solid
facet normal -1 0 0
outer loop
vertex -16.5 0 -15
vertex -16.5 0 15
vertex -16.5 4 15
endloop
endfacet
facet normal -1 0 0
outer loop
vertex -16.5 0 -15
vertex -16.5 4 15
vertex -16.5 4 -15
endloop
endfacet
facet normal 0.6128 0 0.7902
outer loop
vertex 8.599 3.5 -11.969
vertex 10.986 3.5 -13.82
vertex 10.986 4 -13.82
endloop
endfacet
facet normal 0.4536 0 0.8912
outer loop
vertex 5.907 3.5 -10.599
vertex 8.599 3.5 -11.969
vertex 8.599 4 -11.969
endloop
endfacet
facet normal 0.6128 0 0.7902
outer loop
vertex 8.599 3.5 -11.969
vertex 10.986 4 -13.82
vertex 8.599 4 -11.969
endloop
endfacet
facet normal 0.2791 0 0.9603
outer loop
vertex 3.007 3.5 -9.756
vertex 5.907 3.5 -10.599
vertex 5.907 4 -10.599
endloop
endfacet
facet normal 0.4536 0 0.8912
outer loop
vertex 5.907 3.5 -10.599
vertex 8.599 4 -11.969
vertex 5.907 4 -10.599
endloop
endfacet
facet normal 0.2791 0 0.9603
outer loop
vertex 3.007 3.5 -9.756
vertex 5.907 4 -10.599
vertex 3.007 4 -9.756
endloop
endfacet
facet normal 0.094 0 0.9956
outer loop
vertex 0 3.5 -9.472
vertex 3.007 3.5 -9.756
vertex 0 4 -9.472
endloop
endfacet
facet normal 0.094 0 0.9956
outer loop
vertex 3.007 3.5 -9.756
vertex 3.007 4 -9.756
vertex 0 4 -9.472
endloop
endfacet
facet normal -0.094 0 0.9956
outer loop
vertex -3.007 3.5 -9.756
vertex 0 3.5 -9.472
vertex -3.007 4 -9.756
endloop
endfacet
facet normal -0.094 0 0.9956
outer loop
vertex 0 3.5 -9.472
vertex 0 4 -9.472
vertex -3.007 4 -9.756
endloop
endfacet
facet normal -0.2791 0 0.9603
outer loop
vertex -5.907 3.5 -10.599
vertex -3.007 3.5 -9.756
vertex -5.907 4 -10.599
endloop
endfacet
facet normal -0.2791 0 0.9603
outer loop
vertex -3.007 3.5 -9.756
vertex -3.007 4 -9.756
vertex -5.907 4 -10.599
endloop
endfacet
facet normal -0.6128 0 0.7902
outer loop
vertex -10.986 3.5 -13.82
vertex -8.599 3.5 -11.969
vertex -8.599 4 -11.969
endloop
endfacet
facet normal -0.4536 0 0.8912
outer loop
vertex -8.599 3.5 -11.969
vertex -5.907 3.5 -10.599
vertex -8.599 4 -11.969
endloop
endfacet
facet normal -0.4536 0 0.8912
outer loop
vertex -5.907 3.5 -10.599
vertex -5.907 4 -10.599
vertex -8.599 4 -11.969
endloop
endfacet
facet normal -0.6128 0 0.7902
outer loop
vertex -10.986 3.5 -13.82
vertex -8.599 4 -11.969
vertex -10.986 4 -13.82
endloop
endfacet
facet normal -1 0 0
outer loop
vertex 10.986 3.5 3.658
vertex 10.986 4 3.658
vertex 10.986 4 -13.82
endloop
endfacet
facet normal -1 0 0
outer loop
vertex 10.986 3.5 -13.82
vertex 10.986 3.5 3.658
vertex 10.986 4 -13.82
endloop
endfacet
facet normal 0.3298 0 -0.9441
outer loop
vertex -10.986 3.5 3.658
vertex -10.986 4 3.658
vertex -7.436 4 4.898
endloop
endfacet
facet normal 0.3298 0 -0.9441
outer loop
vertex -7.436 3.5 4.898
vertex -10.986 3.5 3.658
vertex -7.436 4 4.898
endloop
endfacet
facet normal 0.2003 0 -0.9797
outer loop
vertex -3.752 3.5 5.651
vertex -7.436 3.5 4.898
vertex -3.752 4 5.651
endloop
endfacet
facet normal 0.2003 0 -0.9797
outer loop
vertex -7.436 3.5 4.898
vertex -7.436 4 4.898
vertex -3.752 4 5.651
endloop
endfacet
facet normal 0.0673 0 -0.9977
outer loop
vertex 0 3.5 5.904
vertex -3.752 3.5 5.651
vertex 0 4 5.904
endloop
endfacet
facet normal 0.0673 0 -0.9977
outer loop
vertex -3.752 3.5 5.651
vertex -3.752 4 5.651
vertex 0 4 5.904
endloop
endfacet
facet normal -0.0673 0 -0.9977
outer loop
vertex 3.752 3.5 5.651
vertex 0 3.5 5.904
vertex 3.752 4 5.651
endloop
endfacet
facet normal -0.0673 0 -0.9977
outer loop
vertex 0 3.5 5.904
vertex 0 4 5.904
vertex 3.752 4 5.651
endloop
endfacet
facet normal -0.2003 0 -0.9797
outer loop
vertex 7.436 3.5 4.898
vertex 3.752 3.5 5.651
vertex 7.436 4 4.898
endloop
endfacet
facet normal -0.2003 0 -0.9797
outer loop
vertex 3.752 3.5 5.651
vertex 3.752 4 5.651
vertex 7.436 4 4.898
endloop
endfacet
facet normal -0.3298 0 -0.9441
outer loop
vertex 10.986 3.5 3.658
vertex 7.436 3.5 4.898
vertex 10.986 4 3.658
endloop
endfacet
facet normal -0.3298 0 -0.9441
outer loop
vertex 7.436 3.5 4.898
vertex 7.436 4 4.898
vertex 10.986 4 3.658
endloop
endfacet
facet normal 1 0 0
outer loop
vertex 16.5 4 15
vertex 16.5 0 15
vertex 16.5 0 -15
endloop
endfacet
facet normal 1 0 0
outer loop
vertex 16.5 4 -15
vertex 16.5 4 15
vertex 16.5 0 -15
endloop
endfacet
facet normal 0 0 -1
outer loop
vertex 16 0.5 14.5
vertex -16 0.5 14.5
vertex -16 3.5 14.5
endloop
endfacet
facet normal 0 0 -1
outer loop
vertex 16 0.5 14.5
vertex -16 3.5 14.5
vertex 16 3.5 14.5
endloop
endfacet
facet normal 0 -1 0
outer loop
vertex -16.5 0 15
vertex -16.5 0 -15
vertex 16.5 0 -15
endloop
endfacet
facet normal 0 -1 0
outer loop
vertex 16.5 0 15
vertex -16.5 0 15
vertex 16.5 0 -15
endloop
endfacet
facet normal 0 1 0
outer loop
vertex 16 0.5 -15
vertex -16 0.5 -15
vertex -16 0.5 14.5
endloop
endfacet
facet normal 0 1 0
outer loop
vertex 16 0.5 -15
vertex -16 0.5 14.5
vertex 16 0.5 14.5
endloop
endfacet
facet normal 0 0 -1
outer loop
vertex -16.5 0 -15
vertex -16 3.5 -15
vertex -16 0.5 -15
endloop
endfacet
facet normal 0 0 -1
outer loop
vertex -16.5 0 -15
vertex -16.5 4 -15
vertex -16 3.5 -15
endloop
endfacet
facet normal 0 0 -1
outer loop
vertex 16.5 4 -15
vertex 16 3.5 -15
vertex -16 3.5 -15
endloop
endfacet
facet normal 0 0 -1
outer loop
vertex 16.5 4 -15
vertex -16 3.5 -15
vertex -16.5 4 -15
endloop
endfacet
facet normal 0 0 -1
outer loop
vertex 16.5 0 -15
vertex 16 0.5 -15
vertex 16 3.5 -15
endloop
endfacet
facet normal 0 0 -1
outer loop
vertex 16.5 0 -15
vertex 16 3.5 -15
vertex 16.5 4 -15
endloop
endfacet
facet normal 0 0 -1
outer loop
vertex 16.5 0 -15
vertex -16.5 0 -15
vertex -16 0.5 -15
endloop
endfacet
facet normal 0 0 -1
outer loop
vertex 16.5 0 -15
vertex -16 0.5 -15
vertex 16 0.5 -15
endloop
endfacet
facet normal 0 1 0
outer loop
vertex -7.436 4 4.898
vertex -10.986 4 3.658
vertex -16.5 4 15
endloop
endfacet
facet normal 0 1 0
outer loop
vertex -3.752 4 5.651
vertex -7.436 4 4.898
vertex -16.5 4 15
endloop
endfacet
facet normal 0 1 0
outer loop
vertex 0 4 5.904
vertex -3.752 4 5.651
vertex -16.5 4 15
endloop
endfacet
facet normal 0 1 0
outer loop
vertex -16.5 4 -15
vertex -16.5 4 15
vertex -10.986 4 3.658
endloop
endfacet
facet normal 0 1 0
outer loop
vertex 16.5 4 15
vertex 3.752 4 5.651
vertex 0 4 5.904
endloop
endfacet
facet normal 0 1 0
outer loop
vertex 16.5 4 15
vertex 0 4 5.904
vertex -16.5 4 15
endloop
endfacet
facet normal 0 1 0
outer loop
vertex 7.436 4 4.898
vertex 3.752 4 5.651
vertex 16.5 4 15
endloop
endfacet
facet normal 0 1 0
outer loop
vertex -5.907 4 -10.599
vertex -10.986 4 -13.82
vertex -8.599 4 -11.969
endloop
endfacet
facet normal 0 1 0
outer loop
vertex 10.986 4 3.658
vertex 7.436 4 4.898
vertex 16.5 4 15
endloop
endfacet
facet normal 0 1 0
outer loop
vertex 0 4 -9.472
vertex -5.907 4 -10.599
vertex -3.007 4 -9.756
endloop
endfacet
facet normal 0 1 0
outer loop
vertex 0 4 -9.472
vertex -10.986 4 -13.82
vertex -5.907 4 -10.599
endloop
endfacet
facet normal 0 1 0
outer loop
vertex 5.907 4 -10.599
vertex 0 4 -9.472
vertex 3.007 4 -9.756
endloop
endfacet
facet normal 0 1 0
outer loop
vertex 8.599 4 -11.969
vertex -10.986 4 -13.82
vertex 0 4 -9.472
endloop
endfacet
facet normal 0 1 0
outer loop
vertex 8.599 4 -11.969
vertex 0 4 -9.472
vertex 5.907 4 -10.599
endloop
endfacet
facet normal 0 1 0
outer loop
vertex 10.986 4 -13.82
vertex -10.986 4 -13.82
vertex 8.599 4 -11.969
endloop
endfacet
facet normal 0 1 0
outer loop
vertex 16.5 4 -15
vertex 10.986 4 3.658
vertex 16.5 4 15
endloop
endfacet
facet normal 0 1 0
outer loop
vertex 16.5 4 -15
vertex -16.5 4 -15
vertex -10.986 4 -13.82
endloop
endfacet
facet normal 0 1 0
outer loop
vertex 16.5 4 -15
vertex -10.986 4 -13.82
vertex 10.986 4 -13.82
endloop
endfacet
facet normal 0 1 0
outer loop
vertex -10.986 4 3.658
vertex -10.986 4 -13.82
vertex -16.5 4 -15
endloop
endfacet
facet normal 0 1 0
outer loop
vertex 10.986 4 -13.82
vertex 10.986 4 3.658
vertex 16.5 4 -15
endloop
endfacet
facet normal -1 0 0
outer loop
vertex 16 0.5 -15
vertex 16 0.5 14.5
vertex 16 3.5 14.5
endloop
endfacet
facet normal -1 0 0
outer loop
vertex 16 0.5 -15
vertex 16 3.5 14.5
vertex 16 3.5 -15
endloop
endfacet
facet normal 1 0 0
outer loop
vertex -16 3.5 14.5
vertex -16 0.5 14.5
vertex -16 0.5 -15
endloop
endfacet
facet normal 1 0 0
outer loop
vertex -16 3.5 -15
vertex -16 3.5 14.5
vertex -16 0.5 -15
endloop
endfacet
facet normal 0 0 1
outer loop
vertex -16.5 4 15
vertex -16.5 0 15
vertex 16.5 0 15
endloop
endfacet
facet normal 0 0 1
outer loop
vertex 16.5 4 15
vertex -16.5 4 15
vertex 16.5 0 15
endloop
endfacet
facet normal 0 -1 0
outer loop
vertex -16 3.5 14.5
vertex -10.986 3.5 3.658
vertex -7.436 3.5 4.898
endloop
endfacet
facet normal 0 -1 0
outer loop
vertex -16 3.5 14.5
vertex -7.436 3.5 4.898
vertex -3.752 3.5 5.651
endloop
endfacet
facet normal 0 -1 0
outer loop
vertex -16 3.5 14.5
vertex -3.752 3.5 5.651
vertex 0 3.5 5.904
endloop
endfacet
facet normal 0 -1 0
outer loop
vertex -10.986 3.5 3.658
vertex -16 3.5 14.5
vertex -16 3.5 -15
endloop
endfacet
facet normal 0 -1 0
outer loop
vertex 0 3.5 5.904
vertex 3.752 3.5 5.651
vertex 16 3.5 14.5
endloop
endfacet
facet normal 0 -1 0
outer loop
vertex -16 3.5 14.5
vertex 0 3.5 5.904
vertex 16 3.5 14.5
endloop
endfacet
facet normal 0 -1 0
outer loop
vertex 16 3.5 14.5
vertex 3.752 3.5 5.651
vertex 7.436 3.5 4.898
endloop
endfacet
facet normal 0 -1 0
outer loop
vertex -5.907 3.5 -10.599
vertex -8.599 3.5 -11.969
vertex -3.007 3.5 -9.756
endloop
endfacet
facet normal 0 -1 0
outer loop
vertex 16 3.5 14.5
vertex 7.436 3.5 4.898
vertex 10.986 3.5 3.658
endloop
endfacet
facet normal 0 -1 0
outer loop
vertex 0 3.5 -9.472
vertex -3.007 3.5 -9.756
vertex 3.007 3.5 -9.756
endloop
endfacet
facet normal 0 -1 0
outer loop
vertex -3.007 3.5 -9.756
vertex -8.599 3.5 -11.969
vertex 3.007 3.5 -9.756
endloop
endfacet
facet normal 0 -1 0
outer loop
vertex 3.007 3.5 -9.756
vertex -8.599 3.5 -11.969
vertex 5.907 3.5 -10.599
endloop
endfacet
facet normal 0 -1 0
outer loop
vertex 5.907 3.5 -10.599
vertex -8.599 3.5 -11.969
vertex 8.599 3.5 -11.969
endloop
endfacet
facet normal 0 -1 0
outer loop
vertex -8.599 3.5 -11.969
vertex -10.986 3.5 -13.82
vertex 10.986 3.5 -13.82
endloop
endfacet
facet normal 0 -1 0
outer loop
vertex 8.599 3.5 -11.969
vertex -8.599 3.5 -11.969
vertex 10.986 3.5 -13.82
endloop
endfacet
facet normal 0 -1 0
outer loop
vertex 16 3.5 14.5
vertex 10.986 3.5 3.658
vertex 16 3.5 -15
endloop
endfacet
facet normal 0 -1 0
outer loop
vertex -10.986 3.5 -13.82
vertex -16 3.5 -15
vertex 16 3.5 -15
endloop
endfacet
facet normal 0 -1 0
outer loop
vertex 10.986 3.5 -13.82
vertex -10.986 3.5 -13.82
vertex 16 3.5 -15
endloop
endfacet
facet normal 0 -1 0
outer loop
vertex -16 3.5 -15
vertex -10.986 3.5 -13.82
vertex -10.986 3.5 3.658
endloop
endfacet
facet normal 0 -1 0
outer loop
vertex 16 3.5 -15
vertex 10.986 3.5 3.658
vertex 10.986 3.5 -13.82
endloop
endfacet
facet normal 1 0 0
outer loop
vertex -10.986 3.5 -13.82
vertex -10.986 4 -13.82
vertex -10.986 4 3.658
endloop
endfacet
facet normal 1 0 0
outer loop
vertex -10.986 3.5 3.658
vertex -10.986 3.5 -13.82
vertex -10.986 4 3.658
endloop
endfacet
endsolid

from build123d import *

# Parameters (mm, degrees)
SKETCH_1_W          = 33
SKETCH_1_H          = 30
EXTRUDE_1_DEPTH     = 4
SHELL_1_T           = -0.5
CUT_EXTRUDE_2_DEPTH = 1


with BuildPart() as part:
    # 草图1 → 拉伸1 (new body)
    with BuildSketch(Plane(origin=(0, 0, 0), x_dir=(1, 0, 0), z_dir=(0, 1, 0))):
        Rectangle(SKETCH_1_W, SKETCH_1_H)
    extrude(amount=EXTRUDE_1_DEPTH)

    # 抽壳1
    shell_1_openings = [part.faces().sort_by_distance(p)[0] for p in [
        (0, 2, -15),
    ]]
    offset(amount=SHELL_1_T, openings=shell_1_openings, kind=Kind.INTERSECTION)

    # 草图2 → 切除-拉伸2 (cut)
    with BuildSketch(Plane(origin=(0, 4, 0), x_dir=(-1, 0, 0), z_dir=(0, 1, 0))):
        with BuildLine():
            Line((10.985566132, -13.819893674), (10.985566132, 3.658083867))
            ThreePointArc((10.985566132, 3.658083867), (0, 5.904035161), (-10.985566132, 3.658083867))
            Line((-10.985566132, 3.658083867), (-10.985566132, -13.819893674))
            ThreePointArc((-10.985566132, -13.819893674), (0, -9.472380487), (10.985566132, -13.819893674))
        make_face()
    extrude(amount=-CUT_EXTRUDE_2_DEPTH, mode=Mode.SUBTRACT)


solid = part.part
